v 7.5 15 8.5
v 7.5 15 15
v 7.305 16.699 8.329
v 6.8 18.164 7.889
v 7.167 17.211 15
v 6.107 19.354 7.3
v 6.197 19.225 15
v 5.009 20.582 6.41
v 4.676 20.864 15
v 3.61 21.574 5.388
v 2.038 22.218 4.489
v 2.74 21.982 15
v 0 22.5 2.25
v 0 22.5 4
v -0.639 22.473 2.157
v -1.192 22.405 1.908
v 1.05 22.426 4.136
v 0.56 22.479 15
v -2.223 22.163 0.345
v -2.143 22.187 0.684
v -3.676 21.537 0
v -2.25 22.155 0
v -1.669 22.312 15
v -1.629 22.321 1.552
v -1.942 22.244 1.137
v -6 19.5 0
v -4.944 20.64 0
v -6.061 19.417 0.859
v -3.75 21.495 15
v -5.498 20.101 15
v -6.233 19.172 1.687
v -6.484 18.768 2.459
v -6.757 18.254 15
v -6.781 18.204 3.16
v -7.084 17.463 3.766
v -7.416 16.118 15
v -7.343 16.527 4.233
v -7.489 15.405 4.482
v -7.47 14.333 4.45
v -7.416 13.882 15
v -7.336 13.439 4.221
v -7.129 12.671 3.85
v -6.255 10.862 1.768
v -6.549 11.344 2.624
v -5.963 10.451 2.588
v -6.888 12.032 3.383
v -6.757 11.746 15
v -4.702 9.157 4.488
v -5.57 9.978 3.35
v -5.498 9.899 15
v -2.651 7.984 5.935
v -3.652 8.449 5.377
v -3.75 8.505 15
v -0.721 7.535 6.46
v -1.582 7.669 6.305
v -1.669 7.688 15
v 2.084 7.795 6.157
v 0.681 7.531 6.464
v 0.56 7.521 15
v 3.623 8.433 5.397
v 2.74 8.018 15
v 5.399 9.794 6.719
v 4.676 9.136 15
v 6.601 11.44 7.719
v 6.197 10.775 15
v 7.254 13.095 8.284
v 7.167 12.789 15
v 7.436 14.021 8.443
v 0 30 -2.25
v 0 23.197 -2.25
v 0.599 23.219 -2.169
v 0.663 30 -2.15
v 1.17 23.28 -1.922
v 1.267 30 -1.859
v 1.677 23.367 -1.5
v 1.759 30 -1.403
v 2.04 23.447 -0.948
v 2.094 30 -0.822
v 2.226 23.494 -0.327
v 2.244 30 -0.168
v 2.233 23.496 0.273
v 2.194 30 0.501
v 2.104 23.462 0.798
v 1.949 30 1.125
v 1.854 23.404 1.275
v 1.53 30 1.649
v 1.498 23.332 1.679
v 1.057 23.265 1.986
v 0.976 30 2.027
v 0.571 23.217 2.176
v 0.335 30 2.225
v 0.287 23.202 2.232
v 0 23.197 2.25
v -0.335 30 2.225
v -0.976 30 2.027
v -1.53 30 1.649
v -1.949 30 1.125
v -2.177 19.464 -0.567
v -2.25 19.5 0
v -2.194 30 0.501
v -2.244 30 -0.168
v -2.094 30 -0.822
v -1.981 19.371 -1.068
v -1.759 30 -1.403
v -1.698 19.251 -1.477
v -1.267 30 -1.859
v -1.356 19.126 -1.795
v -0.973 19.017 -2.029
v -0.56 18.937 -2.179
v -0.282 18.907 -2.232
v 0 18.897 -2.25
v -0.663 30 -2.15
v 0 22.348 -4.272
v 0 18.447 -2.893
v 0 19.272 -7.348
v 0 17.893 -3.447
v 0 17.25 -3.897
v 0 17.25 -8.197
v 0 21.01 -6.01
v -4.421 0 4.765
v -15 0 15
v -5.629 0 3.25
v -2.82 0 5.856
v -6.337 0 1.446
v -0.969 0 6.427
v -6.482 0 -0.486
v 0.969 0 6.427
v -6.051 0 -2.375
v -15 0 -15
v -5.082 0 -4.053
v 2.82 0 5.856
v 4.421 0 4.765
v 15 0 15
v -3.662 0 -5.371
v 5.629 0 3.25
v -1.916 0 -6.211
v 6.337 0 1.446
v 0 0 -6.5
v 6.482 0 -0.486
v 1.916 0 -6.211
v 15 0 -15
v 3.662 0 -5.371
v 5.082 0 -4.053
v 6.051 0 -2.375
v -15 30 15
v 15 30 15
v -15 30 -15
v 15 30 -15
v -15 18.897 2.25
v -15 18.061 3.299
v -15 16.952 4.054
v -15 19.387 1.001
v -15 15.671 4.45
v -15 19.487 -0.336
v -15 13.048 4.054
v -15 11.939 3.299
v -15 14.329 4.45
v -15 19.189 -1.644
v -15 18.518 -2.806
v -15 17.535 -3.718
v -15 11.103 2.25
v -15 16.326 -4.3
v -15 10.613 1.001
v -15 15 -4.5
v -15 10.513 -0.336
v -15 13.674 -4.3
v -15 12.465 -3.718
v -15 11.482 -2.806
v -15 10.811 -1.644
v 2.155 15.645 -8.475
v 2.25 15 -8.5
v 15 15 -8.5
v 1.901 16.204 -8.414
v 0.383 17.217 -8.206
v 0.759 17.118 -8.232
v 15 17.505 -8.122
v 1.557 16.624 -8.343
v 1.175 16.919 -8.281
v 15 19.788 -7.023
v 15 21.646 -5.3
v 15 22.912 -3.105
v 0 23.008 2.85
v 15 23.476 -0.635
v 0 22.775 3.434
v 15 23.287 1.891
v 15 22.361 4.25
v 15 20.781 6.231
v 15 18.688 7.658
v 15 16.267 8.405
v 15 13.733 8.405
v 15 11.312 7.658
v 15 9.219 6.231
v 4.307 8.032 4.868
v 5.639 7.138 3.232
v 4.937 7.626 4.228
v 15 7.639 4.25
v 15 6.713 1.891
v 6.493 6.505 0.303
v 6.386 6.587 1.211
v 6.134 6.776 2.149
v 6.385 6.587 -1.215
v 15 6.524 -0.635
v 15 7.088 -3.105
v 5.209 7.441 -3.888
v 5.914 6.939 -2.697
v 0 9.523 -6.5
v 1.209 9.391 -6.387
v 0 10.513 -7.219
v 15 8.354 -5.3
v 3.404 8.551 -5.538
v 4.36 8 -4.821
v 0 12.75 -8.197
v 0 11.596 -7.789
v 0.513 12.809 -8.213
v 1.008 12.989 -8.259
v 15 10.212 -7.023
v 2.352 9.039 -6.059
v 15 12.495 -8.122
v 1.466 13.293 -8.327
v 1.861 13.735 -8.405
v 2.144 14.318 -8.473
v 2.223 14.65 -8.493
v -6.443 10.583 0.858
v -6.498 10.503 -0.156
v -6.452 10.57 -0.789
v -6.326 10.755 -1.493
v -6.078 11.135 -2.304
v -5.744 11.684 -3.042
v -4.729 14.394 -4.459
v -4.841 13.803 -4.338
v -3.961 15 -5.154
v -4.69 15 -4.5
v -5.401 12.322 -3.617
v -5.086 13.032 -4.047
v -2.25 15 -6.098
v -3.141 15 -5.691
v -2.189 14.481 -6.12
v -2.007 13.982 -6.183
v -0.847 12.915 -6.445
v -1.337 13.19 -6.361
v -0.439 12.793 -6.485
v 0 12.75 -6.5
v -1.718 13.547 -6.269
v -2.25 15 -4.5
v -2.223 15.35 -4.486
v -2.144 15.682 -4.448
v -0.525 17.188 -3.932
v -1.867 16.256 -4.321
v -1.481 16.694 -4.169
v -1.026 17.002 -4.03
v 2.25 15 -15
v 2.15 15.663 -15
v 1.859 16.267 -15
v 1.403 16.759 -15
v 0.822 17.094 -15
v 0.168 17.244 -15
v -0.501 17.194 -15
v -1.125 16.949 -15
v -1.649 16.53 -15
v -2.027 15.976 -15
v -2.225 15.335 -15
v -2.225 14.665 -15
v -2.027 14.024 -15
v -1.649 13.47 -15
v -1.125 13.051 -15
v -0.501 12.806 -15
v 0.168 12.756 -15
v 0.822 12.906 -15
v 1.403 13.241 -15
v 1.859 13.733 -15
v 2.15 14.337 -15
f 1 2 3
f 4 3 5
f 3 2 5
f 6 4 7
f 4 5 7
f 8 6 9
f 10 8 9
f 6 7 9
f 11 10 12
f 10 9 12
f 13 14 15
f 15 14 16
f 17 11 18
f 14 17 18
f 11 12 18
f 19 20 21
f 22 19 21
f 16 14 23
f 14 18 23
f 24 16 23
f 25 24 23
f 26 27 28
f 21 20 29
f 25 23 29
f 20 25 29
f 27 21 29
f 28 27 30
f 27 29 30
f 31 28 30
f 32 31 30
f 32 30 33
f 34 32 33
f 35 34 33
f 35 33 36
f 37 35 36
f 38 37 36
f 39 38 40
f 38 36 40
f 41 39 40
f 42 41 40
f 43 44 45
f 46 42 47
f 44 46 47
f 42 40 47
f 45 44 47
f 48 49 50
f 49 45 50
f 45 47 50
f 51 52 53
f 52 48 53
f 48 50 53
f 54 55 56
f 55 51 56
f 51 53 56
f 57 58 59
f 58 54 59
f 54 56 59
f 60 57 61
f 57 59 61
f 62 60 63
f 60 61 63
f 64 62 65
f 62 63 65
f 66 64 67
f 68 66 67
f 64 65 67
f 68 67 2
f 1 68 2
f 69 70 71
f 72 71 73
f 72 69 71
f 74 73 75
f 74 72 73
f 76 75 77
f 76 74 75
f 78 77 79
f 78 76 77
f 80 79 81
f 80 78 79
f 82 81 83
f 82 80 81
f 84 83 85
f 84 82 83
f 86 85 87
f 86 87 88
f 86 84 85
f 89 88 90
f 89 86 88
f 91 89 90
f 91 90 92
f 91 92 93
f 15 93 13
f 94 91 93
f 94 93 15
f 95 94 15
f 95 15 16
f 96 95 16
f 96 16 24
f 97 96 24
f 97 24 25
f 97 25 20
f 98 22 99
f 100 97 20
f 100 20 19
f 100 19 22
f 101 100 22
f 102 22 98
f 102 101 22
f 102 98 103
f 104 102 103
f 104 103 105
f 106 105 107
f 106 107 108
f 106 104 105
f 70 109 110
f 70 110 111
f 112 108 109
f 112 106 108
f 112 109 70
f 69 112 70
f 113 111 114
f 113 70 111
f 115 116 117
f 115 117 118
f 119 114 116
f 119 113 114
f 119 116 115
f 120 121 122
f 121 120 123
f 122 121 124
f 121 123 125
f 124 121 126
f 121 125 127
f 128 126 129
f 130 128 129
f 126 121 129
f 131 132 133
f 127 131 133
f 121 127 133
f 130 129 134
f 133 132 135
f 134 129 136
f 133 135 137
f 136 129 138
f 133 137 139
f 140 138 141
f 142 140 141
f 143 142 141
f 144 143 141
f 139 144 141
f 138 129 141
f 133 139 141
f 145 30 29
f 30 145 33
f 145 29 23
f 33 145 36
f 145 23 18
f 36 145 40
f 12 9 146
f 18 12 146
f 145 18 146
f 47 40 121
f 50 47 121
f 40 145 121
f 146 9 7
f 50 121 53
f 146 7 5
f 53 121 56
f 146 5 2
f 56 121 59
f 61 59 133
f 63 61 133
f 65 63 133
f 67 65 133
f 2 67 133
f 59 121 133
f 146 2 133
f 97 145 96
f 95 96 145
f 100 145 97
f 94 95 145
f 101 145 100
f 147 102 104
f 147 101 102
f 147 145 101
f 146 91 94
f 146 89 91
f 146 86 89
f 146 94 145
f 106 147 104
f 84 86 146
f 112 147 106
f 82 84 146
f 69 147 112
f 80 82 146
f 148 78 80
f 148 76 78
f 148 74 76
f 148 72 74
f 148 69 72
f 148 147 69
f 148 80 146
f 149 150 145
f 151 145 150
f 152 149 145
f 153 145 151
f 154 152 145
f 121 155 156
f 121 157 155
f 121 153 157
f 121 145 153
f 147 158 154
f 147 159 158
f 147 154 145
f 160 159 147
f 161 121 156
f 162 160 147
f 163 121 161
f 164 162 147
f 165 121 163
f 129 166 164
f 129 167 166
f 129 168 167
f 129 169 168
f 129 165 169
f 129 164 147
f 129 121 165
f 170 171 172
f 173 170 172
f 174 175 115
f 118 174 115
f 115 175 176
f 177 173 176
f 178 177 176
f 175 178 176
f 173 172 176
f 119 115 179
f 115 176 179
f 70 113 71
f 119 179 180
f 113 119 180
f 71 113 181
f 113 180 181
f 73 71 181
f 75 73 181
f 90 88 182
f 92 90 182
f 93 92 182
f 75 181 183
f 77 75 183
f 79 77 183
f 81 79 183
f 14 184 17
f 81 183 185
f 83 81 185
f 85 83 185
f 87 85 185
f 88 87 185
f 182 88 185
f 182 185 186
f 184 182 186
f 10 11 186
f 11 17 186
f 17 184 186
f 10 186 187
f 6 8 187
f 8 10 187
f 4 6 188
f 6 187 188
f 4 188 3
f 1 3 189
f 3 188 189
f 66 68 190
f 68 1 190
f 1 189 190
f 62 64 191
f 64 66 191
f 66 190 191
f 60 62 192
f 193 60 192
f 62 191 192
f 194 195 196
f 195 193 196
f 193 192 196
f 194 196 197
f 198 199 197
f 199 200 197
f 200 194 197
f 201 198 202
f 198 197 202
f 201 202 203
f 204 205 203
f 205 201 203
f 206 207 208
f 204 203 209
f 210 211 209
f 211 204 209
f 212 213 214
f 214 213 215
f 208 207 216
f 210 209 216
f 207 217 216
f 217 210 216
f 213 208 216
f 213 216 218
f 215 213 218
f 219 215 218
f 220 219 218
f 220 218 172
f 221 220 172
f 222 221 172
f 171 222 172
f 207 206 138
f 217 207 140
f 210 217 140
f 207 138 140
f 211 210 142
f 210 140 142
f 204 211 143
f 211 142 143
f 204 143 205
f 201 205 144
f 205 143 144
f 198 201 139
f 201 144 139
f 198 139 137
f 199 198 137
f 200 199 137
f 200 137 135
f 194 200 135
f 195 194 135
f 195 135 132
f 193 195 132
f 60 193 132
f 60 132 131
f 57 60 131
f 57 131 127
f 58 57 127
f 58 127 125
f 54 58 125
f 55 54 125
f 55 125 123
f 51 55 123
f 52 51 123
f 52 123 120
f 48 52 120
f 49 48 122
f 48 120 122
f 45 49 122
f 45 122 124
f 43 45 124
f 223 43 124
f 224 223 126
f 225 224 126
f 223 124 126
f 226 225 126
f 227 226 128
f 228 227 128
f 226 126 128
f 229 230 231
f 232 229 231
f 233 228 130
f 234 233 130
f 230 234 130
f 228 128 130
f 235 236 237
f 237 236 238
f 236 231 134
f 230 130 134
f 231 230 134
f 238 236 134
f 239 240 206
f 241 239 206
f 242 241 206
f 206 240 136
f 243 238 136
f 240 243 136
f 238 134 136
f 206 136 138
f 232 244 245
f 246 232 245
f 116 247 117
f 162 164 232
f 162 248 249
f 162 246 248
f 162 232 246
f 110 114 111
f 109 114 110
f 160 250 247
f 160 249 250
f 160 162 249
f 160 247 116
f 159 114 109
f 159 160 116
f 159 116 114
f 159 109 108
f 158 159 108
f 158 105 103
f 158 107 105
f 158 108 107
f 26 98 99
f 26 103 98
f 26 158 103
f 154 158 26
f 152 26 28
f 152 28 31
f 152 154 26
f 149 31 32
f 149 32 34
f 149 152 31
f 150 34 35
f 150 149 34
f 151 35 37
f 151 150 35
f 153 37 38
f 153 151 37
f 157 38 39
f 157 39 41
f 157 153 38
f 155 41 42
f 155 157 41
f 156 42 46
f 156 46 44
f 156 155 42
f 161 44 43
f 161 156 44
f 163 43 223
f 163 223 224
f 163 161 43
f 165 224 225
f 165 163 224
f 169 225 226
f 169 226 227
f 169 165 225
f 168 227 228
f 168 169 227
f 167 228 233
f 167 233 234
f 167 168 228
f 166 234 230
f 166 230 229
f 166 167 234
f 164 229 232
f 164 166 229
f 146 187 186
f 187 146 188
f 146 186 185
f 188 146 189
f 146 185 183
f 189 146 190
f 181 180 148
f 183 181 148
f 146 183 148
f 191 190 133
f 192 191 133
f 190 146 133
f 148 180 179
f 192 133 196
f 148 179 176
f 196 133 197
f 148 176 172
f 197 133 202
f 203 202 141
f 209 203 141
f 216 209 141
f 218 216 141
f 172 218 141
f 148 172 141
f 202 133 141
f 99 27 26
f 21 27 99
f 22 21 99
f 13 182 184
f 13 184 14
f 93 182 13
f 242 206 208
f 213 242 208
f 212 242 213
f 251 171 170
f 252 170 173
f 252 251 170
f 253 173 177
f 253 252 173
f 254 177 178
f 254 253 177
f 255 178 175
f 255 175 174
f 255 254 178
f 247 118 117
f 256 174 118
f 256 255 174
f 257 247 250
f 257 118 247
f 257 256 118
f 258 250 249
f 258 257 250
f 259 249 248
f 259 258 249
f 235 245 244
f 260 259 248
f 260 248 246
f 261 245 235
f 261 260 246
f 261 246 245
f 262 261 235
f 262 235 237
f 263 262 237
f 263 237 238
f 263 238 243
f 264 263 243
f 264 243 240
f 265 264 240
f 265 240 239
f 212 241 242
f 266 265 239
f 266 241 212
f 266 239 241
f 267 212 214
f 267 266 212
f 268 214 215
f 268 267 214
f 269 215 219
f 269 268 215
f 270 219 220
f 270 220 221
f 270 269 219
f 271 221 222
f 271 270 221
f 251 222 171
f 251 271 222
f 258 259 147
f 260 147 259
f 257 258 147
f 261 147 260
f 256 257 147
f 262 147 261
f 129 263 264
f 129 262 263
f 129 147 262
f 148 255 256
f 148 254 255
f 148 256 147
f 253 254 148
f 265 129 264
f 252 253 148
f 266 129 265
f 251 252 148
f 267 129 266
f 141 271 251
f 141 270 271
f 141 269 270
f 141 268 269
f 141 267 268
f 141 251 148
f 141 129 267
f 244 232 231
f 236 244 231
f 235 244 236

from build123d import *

# Parameters (mm, degrees)
SKETCH_1_W               = 30
SKETCH_1_H               = 30
EXTRUDE_1_DEPTH          = 30
SKETCH_2_R               = 6.5
CUT_EXTRUDE_1_DEPTH      = 15
SKETCH_3_R               = 8.5
CUT_EXTRUDE_2_DEPTH      = 15
SKETCH_4_R               = 7.5
CUT_EXTRUDE_3_DEPTH      = 15
CUT_EXTRUDE_5_DEPTH      = 37.742346223
CUT_EXTRUDE_5_DEPTH_BACK = 37.742346223
SKETCH_5_R               = 2.25
CUT_EXTRUDE_6_DEPTH      = 46.0000001
CUT_EXTRUDE_6_DEPTH_BACK = 46.0000001
SKETCH_6_R               = 2.25
CUT_EXTRUDE_7_DEPTH      = 46.0000001
CUT_EXTRUDE_7_DEPTH_BACK = 46.0000001
SKETCH_7_R               = 4.5


with BuildPart() as part:
    # 草图1 → 凸台-拉伸1 (new body)
    with BuildSketch(Plane(origin=(0, 0, 0), x_dir=(1, 0, 0), z_dir=(0, 1, 0))):
        Rectangle(SKETCH_1_W, SKETCH_1_H)
    extrude(amount=EXTRUDE_1_DEPTH)

    # 草图2 → 切除-拉伸1 (cut)
    with BuildSketch(Plane.XZ):
        with Locations(Location((0, 0, 0), (0, 0, 270))):
            Circle(SKETCH_2_R)
    extrude(amount=-CUT_EXTRUDE_1_DEPTH, mode=Mode.SUBTRACT)

    # 草图3 → 切除-拉伸2 (cut)
    with BuildSketch(Plane(origin=(15, 0, 0), x_dir=(0, 0, -1), z_dir=(1, 0, 0))):
        with Locations((0, 15)):
            Circle(SKETCH_3_R)
    extrude(amount=-CUT_EXTRUDE_2_DEPTH, mode=Mode.SUBTRACT)

    # 草图4 → 切除-拉伸3 (cut)
    with BuildSketch(Plane.XY.offset(15)):
        with Locations((0, 15)):
            Circle(SKETCH_4_R)
    extrude(amount=-CUT_EXTRUDE_3_DEPTH, mode=Mode.SUBTRACT)

    # 草图5 → 切除-拉伸5 (cut, two sides: drawn at the far end of the back side and taken through both)
    with BuildSketch(Plane.XZ.offset(-CUT_EXTRUDE_5_DEPTH_BACK)):
        with Locations(Location((0, 0, 0), (0, 0, 270))):
            Circle(SKETCH_5_R)
    extrude(amount=CUT_EXTRUDE_5_DEPTH + CUT_EXTRUDE_5_DEPTH_BACK, mode=Mode.SUBTRACT)

    # 草图6 → 切除-拉伸6 (cut, two sides: drawn at the far end of the back side and taken through both)
    with BuildSketch(Plane.XY.offset(15).offset(-CUT_EXTRUDE_6_DEPTH_BACK)):
        with Locations((0, 15)):
            Circle(SKETCH_6_R)
    extrude(amount=CUT_EXTRUDE_6_DEPTH + CUT_EXTRUDE_6_DEPTH_BACK, mode=Mode.SUBTRACT)

    # 草图7 → 切除-拉伸7 (cut, two sides: drawn at the far end of the back side and taken through both)
    with BuildSketch(Plane(origin=(15, 0, 0), x_dir=(0, 0, -1), z_dir=(1, 0, 0)).offset(-CUT_EXTRUDE_7_DEPTH_BACK)):
        with Locations((0, 15)):
            Circle(SKETCH_7_R)
    extrude(amount=CUT_EXTRUDE_7_DEPTH + CUT_EXTRUDE_7_DEPTH_BACK, mode=Mode.SUBTRACT)


solid = part.part
